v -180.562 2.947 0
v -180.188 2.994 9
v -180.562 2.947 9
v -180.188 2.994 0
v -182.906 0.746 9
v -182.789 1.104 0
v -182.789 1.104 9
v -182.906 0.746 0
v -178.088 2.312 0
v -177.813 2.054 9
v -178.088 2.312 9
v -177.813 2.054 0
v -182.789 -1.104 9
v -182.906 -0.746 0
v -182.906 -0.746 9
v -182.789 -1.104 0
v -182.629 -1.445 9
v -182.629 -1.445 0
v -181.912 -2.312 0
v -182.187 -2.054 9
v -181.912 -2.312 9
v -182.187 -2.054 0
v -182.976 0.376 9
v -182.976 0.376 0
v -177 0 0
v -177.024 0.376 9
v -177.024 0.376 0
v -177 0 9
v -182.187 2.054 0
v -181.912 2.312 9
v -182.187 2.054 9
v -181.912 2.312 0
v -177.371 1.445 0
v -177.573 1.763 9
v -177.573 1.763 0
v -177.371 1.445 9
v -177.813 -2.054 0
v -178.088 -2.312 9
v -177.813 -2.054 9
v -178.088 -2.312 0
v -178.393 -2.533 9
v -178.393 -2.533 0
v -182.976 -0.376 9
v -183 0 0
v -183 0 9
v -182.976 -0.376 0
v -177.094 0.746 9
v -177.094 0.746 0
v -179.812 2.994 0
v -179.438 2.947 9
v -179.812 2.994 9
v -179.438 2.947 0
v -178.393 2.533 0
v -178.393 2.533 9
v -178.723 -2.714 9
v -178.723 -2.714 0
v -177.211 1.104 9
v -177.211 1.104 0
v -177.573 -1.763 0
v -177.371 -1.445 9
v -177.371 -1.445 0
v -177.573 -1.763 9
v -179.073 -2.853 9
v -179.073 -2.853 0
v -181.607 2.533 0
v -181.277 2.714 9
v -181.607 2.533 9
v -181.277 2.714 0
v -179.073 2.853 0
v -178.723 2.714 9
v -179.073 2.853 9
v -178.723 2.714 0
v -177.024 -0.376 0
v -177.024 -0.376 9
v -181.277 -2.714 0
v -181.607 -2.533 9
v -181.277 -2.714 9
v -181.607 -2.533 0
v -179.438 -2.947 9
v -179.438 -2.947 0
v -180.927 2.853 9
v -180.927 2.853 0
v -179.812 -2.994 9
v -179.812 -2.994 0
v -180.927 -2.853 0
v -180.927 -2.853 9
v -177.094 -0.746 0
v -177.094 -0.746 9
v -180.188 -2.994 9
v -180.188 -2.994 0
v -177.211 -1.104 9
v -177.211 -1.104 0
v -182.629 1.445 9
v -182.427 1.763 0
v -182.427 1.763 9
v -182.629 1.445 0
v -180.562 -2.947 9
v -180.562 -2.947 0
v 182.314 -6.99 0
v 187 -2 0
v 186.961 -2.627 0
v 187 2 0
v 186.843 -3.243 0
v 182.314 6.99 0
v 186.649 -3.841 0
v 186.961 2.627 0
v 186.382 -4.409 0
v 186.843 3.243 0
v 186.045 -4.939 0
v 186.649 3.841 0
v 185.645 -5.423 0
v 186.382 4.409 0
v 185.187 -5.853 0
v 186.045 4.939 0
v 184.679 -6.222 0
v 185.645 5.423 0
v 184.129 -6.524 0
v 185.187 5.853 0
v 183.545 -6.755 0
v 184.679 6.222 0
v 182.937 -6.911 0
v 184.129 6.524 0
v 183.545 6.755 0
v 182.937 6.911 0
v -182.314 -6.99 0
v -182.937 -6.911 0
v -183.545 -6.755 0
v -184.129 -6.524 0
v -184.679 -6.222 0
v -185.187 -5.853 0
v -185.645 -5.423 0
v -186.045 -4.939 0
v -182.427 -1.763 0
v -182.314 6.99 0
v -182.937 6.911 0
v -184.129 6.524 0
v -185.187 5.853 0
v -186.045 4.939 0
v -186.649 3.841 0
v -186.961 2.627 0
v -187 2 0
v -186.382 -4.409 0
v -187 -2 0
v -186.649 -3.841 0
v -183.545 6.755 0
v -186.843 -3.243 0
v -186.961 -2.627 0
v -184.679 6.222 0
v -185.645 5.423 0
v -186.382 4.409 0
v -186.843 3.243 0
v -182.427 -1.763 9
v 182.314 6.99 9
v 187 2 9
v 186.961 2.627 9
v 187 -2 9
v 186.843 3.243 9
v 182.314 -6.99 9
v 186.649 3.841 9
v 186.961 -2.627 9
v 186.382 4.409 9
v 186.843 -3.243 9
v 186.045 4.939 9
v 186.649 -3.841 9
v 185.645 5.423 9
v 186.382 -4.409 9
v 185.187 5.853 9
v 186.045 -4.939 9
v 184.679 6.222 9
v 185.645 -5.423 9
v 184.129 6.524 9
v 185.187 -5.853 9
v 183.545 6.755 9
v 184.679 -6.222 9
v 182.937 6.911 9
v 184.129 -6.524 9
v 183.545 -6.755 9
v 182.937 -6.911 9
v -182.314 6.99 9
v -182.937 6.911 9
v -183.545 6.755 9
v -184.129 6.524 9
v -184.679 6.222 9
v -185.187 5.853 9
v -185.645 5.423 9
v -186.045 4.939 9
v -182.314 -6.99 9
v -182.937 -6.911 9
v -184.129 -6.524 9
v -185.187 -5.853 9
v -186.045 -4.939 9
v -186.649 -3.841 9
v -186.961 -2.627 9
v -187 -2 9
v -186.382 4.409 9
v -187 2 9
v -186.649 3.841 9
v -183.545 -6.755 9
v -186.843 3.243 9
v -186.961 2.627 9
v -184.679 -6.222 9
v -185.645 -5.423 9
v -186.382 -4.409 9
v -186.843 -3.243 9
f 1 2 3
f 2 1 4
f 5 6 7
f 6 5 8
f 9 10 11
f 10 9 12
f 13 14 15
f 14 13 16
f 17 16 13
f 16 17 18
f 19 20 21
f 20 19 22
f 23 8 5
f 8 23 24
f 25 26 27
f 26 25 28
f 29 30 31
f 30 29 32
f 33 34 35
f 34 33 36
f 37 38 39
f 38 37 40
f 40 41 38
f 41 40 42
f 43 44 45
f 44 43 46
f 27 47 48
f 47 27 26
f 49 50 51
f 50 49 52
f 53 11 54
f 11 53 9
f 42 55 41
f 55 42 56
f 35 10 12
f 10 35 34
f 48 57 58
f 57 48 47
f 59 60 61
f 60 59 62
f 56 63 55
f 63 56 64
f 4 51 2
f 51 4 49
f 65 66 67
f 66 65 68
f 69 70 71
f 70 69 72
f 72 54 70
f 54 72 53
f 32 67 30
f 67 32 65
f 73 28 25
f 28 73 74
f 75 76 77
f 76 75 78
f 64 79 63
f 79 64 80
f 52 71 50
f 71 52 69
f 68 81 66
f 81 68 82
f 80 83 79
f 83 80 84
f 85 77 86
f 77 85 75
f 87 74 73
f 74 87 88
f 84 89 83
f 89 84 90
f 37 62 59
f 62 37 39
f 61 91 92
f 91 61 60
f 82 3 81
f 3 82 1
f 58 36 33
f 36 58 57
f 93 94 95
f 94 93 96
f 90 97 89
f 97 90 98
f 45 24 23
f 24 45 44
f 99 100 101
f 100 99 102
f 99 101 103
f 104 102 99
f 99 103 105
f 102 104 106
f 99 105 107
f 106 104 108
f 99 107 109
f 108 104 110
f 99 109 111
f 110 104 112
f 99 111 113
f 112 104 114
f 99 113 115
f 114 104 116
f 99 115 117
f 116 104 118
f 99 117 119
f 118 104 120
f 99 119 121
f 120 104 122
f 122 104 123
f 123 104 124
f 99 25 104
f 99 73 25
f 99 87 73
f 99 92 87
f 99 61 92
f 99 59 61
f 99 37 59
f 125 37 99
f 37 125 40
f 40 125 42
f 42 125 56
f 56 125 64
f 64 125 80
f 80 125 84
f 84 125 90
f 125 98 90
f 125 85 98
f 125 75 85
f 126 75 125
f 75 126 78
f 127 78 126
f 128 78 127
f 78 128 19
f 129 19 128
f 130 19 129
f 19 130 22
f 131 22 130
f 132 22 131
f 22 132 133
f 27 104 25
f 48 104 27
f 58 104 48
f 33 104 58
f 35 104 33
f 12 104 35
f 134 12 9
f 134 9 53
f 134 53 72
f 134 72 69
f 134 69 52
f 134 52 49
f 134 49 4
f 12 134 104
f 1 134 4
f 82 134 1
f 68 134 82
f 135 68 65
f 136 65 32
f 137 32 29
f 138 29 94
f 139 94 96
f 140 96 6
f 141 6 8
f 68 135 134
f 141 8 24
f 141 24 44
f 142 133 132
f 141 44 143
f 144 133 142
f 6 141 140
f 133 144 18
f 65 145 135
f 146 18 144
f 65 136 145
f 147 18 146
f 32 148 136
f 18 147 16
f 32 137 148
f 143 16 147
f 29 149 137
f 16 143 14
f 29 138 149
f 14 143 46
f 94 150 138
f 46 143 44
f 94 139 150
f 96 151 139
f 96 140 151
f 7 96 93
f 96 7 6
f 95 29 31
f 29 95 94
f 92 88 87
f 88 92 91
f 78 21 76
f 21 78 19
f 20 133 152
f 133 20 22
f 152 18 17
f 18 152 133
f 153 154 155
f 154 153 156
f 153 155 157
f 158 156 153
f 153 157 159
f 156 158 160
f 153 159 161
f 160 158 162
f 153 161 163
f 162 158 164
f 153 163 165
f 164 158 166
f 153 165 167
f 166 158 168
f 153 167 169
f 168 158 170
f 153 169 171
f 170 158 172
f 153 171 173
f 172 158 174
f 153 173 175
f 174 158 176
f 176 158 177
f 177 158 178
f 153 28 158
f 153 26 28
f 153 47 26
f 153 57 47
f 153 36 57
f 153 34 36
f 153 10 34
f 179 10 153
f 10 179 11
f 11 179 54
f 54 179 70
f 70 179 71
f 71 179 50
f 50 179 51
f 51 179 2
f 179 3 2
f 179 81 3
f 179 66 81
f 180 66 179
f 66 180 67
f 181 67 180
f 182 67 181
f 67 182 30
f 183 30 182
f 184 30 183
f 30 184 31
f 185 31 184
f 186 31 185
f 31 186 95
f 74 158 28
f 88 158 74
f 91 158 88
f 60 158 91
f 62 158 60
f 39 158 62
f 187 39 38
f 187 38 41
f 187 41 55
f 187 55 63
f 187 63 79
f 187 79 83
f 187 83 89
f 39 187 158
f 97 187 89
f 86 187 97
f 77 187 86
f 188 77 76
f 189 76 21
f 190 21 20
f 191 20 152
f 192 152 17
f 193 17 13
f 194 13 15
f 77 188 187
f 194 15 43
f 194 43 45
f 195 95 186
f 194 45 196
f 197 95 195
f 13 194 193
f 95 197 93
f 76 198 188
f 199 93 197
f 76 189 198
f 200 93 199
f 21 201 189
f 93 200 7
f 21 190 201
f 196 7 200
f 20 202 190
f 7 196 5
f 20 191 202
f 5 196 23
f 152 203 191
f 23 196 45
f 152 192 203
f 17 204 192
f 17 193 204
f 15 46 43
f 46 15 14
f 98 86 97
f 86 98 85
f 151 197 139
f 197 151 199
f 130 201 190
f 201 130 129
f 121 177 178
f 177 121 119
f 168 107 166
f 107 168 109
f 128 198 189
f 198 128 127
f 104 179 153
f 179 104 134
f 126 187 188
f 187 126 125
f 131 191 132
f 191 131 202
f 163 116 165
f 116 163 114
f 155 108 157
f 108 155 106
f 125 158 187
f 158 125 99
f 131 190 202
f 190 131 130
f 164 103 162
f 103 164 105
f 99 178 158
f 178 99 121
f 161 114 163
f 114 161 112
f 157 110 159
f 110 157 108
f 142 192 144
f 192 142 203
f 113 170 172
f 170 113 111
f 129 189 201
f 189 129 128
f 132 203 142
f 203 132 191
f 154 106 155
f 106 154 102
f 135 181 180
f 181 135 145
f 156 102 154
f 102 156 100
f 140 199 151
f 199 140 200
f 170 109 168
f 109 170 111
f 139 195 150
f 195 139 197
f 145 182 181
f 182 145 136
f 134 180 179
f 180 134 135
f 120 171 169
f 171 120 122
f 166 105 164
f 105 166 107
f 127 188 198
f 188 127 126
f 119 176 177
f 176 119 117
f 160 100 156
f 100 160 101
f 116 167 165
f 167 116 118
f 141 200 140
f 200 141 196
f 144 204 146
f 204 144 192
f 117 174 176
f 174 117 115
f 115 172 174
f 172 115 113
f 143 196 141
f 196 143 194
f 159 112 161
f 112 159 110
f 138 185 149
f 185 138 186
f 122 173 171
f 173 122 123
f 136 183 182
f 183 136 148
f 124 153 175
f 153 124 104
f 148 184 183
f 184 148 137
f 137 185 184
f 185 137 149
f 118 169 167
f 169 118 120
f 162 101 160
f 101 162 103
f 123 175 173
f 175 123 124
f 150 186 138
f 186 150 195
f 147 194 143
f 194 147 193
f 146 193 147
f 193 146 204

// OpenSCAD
$fn = 50;


difference() {
	union() {
		hull() {
			translate(v = [-182.0000000000, 2.0000000000, 0]) {
				cylinder(h = 9, r = 5);
			}
			translate(v = [182.0000000000, 2.0000000000, 0]) {
				cylinder(h = 9, r = 5);
			}
			translate(v = [-182.0000000000, -2.0000000000, 0]) {
				cylinder(h = 9, r = 5);
			}
			translate(v = [182.0000000000, -2.0000000000, 0]) {
				cylinder(h = 9, r = 5);
			}
		}
	}
	union() {
		translate(v = [-180.0000000000, 0.0000000000, 0]) {
			cylinder(h = 9, r = 3.0000000000);
		}
		translate(v = [-180.0000000000, 0.0000000000, 0]) {
			cylinder(h = 9, r = 1.5000000000);
		}
		translate(v = [-180.0000000000, 0.0000000000, 0]) {
			cylinder(h = 9, r = 1.5000000000);
		}
		translate(v = [-180.0000000000, 0.0000000000, 0]) {
			cylinder(h = 9, r = 1.5000000000);
		}
	}
}
